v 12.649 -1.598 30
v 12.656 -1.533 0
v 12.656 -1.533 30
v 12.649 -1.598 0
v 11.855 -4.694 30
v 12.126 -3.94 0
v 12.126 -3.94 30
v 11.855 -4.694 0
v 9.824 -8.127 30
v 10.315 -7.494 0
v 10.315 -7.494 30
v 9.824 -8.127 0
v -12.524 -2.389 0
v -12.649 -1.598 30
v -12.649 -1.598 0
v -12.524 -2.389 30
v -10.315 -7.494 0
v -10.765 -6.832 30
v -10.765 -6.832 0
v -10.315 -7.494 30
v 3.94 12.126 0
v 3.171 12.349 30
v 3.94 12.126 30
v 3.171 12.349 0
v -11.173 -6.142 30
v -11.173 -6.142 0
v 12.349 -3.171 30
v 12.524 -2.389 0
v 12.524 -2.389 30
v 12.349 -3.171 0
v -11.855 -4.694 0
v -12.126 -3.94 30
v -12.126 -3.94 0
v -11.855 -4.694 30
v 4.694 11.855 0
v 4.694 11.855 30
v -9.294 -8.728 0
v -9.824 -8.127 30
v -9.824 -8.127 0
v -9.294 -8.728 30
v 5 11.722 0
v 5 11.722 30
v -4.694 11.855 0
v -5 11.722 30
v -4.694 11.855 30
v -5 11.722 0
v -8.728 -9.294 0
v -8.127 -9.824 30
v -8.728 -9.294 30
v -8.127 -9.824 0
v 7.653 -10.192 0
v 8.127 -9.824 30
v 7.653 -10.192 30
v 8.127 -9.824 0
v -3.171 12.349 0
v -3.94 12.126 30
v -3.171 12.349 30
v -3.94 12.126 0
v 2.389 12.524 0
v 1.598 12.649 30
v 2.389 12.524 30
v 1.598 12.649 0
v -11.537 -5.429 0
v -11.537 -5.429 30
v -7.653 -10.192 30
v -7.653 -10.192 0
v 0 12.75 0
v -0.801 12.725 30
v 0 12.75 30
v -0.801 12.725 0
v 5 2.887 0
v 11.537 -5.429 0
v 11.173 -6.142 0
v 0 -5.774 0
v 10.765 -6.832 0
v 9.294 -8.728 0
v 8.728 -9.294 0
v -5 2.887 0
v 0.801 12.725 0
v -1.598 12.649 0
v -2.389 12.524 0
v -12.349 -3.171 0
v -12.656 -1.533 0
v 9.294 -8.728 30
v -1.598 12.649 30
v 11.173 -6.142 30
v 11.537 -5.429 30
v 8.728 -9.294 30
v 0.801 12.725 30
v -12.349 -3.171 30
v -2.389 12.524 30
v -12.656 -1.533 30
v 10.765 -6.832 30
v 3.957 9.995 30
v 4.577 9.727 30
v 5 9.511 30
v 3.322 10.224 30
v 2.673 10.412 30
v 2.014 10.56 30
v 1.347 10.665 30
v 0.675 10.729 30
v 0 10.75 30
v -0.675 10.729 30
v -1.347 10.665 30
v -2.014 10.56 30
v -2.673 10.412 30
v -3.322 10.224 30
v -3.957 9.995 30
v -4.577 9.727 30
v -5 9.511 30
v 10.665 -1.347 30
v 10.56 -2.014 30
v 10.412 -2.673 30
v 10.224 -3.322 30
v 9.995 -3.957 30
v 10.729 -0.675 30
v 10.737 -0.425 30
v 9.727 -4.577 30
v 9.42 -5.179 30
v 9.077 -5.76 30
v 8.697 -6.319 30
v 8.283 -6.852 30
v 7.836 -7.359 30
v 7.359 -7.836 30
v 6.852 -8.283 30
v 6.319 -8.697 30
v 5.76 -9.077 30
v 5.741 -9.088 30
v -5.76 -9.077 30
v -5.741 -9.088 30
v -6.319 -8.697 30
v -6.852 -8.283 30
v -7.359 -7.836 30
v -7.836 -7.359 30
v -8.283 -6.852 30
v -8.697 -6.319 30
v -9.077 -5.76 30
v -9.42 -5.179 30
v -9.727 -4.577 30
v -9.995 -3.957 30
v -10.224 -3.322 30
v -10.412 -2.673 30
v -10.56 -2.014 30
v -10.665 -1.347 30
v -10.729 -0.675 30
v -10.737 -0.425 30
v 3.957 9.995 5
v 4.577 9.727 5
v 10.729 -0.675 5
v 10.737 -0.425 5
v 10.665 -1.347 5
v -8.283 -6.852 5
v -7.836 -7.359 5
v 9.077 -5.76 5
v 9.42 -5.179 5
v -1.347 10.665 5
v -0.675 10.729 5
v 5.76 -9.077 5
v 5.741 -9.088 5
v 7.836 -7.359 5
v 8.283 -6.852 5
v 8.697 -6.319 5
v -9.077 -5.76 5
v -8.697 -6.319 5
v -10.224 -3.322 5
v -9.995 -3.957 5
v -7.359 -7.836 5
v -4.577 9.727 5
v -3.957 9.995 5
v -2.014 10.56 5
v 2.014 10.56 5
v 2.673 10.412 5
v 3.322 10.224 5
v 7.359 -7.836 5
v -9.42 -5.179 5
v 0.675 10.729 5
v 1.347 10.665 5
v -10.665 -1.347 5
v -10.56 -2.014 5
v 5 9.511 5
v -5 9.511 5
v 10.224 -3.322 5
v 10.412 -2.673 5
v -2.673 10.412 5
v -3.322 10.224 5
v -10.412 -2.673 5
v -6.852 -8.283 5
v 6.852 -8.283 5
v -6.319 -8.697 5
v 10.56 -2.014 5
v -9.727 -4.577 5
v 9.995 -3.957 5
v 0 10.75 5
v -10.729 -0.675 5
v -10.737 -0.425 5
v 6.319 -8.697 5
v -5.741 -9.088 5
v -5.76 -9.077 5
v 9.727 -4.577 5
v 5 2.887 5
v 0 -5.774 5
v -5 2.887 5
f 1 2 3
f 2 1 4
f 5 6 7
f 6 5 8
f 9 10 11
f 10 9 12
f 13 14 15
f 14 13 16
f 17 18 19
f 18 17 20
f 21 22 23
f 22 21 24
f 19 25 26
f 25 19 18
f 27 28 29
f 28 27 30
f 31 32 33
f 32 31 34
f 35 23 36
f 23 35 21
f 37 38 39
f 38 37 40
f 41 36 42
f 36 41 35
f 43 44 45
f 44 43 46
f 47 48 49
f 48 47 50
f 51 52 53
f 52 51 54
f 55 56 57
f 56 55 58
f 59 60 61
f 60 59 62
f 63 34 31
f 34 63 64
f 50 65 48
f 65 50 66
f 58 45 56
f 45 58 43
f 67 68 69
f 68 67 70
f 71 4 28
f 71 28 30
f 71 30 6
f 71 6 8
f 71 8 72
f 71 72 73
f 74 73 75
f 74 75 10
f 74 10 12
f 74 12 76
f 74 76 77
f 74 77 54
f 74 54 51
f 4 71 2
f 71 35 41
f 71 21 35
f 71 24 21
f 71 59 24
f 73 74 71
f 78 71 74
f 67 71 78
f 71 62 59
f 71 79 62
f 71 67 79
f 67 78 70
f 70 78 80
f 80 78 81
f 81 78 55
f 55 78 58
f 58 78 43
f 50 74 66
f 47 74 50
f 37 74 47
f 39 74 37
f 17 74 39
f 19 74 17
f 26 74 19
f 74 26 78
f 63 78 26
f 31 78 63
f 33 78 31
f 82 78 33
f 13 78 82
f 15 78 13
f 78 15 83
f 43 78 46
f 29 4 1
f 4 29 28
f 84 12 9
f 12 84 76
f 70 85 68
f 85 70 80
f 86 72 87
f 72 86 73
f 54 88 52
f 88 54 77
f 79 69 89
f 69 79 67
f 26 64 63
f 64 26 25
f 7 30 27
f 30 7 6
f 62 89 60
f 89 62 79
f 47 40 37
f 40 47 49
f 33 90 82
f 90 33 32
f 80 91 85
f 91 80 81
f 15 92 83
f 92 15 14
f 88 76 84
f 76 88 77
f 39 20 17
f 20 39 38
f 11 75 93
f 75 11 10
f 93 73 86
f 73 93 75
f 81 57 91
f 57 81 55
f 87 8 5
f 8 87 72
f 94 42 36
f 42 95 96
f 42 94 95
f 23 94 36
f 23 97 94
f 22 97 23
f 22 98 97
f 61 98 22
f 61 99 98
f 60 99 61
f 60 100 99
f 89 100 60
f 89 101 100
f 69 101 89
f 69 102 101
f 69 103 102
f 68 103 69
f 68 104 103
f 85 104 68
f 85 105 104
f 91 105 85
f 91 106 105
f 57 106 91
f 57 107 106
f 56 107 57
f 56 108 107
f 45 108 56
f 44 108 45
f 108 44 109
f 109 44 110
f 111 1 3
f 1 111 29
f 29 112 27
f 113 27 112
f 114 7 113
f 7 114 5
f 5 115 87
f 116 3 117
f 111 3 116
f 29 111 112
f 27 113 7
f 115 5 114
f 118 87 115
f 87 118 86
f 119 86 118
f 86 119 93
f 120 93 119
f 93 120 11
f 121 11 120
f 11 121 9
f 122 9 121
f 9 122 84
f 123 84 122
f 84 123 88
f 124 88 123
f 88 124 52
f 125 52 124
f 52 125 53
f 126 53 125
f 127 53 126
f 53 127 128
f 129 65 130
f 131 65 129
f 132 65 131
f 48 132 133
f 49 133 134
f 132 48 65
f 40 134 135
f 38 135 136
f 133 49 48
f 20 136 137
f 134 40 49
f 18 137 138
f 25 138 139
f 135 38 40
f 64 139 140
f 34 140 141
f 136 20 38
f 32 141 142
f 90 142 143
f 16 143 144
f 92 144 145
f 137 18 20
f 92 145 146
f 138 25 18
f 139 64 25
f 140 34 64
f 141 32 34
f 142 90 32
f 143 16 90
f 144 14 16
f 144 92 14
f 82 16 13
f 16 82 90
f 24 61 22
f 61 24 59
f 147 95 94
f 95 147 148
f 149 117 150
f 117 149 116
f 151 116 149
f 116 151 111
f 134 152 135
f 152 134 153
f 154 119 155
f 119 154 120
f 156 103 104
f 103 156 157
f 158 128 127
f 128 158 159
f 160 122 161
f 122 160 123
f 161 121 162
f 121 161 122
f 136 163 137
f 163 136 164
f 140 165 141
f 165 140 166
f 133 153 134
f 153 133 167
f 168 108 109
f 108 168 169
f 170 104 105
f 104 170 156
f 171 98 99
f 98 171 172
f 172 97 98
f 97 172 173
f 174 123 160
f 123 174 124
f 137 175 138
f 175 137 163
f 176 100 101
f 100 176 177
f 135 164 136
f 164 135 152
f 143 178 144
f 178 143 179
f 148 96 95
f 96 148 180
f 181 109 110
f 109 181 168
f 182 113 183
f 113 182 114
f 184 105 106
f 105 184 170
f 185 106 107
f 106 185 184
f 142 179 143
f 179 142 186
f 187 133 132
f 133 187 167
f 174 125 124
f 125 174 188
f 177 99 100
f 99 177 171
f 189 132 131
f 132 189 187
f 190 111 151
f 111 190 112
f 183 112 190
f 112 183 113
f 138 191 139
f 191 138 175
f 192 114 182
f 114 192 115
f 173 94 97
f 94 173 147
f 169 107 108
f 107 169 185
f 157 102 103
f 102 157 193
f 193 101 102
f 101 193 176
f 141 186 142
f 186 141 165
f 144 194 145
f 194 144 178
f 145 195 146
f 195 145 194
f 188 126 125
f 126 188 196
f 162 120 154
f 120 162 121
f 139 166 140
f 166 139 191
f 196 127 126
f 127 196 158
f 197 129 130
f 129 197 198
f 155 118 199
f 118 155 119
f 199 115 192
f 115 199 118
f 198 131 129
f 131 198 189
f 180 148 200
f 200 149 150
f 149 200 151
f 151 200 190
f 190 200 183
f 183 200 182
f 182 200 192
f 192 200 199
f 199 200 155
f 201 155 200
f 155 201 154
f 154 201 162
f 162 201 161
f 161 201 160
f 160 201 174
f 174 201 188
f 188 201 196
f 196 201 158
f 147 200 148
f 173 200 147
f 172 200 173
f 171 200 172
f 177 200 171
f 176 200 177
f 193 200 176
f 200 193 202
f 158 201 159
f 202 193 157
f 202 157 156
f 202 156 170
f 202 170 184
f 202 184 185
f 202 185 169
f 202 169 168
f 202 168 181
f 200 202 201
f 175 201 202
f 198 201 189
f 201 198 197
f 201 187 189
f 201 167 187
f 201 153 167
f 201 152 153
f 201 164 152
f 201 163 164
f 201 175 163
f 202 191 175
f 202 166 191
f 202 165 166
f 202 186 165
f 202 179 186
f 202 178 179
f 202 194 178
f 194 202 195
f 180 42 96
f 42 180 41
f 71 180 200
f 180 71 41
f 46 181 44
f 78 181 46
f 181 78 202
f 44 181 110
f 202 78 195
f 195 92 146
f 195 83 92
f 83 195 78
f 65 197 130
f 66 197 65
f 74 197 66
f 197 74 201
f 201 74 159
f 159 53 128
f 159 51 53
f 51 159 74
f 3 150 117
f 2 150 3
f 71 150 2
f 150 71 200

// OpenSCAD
include <MCAD/units.scad>

/* [Stand] */

// Leg center angles in degrees
legCenterAngles = [0, 120, 240];
// Width of the legs (the chord length)
legWidth = 10;
// Leg segment lengths (innermost segment first, value 0 = placeholder)
legSegmentLengths = [10.75, 2, 0, 0, 0];
// Leg segment heights (innermost segment first, same vector size as legSegmentLengths)
legSegmentHeights = [5, 30, 0, 0, 0];

/* [Hidden] */

$fn = 100;

function add(v, i = 0, imax = 1e200) = i < len(v) - 1 && i < imax ? v[i] + add(v, i + 1, imax) : v[i];

module Stand() {
    intersection() {
        for (i = [0:len(legSegmentLengths) - 1])
            if (legSegmentLengths[i] > 0)
                difference() {
                    cylinder(legSegmentHeights[i], r = add(legSegmentLengths, 0, i));
                    if (i > 0)
                        translate([0, 0, -epsilon])
                        cylinder(legSegmentHeights[i] + epsilon * 3, r = add(legSegmentLengths, 0, i - 1));
                }
        for (a = legCenterAngles)
            rotate([0, 0, a])
            translate([-legWidth / 2, 0, -epsilon])
            cube([legWidth, add(legSegmentLengths) + epsilon, max(legSegmentHeights) + epsilon * 2]);
    }
}

Stand();
